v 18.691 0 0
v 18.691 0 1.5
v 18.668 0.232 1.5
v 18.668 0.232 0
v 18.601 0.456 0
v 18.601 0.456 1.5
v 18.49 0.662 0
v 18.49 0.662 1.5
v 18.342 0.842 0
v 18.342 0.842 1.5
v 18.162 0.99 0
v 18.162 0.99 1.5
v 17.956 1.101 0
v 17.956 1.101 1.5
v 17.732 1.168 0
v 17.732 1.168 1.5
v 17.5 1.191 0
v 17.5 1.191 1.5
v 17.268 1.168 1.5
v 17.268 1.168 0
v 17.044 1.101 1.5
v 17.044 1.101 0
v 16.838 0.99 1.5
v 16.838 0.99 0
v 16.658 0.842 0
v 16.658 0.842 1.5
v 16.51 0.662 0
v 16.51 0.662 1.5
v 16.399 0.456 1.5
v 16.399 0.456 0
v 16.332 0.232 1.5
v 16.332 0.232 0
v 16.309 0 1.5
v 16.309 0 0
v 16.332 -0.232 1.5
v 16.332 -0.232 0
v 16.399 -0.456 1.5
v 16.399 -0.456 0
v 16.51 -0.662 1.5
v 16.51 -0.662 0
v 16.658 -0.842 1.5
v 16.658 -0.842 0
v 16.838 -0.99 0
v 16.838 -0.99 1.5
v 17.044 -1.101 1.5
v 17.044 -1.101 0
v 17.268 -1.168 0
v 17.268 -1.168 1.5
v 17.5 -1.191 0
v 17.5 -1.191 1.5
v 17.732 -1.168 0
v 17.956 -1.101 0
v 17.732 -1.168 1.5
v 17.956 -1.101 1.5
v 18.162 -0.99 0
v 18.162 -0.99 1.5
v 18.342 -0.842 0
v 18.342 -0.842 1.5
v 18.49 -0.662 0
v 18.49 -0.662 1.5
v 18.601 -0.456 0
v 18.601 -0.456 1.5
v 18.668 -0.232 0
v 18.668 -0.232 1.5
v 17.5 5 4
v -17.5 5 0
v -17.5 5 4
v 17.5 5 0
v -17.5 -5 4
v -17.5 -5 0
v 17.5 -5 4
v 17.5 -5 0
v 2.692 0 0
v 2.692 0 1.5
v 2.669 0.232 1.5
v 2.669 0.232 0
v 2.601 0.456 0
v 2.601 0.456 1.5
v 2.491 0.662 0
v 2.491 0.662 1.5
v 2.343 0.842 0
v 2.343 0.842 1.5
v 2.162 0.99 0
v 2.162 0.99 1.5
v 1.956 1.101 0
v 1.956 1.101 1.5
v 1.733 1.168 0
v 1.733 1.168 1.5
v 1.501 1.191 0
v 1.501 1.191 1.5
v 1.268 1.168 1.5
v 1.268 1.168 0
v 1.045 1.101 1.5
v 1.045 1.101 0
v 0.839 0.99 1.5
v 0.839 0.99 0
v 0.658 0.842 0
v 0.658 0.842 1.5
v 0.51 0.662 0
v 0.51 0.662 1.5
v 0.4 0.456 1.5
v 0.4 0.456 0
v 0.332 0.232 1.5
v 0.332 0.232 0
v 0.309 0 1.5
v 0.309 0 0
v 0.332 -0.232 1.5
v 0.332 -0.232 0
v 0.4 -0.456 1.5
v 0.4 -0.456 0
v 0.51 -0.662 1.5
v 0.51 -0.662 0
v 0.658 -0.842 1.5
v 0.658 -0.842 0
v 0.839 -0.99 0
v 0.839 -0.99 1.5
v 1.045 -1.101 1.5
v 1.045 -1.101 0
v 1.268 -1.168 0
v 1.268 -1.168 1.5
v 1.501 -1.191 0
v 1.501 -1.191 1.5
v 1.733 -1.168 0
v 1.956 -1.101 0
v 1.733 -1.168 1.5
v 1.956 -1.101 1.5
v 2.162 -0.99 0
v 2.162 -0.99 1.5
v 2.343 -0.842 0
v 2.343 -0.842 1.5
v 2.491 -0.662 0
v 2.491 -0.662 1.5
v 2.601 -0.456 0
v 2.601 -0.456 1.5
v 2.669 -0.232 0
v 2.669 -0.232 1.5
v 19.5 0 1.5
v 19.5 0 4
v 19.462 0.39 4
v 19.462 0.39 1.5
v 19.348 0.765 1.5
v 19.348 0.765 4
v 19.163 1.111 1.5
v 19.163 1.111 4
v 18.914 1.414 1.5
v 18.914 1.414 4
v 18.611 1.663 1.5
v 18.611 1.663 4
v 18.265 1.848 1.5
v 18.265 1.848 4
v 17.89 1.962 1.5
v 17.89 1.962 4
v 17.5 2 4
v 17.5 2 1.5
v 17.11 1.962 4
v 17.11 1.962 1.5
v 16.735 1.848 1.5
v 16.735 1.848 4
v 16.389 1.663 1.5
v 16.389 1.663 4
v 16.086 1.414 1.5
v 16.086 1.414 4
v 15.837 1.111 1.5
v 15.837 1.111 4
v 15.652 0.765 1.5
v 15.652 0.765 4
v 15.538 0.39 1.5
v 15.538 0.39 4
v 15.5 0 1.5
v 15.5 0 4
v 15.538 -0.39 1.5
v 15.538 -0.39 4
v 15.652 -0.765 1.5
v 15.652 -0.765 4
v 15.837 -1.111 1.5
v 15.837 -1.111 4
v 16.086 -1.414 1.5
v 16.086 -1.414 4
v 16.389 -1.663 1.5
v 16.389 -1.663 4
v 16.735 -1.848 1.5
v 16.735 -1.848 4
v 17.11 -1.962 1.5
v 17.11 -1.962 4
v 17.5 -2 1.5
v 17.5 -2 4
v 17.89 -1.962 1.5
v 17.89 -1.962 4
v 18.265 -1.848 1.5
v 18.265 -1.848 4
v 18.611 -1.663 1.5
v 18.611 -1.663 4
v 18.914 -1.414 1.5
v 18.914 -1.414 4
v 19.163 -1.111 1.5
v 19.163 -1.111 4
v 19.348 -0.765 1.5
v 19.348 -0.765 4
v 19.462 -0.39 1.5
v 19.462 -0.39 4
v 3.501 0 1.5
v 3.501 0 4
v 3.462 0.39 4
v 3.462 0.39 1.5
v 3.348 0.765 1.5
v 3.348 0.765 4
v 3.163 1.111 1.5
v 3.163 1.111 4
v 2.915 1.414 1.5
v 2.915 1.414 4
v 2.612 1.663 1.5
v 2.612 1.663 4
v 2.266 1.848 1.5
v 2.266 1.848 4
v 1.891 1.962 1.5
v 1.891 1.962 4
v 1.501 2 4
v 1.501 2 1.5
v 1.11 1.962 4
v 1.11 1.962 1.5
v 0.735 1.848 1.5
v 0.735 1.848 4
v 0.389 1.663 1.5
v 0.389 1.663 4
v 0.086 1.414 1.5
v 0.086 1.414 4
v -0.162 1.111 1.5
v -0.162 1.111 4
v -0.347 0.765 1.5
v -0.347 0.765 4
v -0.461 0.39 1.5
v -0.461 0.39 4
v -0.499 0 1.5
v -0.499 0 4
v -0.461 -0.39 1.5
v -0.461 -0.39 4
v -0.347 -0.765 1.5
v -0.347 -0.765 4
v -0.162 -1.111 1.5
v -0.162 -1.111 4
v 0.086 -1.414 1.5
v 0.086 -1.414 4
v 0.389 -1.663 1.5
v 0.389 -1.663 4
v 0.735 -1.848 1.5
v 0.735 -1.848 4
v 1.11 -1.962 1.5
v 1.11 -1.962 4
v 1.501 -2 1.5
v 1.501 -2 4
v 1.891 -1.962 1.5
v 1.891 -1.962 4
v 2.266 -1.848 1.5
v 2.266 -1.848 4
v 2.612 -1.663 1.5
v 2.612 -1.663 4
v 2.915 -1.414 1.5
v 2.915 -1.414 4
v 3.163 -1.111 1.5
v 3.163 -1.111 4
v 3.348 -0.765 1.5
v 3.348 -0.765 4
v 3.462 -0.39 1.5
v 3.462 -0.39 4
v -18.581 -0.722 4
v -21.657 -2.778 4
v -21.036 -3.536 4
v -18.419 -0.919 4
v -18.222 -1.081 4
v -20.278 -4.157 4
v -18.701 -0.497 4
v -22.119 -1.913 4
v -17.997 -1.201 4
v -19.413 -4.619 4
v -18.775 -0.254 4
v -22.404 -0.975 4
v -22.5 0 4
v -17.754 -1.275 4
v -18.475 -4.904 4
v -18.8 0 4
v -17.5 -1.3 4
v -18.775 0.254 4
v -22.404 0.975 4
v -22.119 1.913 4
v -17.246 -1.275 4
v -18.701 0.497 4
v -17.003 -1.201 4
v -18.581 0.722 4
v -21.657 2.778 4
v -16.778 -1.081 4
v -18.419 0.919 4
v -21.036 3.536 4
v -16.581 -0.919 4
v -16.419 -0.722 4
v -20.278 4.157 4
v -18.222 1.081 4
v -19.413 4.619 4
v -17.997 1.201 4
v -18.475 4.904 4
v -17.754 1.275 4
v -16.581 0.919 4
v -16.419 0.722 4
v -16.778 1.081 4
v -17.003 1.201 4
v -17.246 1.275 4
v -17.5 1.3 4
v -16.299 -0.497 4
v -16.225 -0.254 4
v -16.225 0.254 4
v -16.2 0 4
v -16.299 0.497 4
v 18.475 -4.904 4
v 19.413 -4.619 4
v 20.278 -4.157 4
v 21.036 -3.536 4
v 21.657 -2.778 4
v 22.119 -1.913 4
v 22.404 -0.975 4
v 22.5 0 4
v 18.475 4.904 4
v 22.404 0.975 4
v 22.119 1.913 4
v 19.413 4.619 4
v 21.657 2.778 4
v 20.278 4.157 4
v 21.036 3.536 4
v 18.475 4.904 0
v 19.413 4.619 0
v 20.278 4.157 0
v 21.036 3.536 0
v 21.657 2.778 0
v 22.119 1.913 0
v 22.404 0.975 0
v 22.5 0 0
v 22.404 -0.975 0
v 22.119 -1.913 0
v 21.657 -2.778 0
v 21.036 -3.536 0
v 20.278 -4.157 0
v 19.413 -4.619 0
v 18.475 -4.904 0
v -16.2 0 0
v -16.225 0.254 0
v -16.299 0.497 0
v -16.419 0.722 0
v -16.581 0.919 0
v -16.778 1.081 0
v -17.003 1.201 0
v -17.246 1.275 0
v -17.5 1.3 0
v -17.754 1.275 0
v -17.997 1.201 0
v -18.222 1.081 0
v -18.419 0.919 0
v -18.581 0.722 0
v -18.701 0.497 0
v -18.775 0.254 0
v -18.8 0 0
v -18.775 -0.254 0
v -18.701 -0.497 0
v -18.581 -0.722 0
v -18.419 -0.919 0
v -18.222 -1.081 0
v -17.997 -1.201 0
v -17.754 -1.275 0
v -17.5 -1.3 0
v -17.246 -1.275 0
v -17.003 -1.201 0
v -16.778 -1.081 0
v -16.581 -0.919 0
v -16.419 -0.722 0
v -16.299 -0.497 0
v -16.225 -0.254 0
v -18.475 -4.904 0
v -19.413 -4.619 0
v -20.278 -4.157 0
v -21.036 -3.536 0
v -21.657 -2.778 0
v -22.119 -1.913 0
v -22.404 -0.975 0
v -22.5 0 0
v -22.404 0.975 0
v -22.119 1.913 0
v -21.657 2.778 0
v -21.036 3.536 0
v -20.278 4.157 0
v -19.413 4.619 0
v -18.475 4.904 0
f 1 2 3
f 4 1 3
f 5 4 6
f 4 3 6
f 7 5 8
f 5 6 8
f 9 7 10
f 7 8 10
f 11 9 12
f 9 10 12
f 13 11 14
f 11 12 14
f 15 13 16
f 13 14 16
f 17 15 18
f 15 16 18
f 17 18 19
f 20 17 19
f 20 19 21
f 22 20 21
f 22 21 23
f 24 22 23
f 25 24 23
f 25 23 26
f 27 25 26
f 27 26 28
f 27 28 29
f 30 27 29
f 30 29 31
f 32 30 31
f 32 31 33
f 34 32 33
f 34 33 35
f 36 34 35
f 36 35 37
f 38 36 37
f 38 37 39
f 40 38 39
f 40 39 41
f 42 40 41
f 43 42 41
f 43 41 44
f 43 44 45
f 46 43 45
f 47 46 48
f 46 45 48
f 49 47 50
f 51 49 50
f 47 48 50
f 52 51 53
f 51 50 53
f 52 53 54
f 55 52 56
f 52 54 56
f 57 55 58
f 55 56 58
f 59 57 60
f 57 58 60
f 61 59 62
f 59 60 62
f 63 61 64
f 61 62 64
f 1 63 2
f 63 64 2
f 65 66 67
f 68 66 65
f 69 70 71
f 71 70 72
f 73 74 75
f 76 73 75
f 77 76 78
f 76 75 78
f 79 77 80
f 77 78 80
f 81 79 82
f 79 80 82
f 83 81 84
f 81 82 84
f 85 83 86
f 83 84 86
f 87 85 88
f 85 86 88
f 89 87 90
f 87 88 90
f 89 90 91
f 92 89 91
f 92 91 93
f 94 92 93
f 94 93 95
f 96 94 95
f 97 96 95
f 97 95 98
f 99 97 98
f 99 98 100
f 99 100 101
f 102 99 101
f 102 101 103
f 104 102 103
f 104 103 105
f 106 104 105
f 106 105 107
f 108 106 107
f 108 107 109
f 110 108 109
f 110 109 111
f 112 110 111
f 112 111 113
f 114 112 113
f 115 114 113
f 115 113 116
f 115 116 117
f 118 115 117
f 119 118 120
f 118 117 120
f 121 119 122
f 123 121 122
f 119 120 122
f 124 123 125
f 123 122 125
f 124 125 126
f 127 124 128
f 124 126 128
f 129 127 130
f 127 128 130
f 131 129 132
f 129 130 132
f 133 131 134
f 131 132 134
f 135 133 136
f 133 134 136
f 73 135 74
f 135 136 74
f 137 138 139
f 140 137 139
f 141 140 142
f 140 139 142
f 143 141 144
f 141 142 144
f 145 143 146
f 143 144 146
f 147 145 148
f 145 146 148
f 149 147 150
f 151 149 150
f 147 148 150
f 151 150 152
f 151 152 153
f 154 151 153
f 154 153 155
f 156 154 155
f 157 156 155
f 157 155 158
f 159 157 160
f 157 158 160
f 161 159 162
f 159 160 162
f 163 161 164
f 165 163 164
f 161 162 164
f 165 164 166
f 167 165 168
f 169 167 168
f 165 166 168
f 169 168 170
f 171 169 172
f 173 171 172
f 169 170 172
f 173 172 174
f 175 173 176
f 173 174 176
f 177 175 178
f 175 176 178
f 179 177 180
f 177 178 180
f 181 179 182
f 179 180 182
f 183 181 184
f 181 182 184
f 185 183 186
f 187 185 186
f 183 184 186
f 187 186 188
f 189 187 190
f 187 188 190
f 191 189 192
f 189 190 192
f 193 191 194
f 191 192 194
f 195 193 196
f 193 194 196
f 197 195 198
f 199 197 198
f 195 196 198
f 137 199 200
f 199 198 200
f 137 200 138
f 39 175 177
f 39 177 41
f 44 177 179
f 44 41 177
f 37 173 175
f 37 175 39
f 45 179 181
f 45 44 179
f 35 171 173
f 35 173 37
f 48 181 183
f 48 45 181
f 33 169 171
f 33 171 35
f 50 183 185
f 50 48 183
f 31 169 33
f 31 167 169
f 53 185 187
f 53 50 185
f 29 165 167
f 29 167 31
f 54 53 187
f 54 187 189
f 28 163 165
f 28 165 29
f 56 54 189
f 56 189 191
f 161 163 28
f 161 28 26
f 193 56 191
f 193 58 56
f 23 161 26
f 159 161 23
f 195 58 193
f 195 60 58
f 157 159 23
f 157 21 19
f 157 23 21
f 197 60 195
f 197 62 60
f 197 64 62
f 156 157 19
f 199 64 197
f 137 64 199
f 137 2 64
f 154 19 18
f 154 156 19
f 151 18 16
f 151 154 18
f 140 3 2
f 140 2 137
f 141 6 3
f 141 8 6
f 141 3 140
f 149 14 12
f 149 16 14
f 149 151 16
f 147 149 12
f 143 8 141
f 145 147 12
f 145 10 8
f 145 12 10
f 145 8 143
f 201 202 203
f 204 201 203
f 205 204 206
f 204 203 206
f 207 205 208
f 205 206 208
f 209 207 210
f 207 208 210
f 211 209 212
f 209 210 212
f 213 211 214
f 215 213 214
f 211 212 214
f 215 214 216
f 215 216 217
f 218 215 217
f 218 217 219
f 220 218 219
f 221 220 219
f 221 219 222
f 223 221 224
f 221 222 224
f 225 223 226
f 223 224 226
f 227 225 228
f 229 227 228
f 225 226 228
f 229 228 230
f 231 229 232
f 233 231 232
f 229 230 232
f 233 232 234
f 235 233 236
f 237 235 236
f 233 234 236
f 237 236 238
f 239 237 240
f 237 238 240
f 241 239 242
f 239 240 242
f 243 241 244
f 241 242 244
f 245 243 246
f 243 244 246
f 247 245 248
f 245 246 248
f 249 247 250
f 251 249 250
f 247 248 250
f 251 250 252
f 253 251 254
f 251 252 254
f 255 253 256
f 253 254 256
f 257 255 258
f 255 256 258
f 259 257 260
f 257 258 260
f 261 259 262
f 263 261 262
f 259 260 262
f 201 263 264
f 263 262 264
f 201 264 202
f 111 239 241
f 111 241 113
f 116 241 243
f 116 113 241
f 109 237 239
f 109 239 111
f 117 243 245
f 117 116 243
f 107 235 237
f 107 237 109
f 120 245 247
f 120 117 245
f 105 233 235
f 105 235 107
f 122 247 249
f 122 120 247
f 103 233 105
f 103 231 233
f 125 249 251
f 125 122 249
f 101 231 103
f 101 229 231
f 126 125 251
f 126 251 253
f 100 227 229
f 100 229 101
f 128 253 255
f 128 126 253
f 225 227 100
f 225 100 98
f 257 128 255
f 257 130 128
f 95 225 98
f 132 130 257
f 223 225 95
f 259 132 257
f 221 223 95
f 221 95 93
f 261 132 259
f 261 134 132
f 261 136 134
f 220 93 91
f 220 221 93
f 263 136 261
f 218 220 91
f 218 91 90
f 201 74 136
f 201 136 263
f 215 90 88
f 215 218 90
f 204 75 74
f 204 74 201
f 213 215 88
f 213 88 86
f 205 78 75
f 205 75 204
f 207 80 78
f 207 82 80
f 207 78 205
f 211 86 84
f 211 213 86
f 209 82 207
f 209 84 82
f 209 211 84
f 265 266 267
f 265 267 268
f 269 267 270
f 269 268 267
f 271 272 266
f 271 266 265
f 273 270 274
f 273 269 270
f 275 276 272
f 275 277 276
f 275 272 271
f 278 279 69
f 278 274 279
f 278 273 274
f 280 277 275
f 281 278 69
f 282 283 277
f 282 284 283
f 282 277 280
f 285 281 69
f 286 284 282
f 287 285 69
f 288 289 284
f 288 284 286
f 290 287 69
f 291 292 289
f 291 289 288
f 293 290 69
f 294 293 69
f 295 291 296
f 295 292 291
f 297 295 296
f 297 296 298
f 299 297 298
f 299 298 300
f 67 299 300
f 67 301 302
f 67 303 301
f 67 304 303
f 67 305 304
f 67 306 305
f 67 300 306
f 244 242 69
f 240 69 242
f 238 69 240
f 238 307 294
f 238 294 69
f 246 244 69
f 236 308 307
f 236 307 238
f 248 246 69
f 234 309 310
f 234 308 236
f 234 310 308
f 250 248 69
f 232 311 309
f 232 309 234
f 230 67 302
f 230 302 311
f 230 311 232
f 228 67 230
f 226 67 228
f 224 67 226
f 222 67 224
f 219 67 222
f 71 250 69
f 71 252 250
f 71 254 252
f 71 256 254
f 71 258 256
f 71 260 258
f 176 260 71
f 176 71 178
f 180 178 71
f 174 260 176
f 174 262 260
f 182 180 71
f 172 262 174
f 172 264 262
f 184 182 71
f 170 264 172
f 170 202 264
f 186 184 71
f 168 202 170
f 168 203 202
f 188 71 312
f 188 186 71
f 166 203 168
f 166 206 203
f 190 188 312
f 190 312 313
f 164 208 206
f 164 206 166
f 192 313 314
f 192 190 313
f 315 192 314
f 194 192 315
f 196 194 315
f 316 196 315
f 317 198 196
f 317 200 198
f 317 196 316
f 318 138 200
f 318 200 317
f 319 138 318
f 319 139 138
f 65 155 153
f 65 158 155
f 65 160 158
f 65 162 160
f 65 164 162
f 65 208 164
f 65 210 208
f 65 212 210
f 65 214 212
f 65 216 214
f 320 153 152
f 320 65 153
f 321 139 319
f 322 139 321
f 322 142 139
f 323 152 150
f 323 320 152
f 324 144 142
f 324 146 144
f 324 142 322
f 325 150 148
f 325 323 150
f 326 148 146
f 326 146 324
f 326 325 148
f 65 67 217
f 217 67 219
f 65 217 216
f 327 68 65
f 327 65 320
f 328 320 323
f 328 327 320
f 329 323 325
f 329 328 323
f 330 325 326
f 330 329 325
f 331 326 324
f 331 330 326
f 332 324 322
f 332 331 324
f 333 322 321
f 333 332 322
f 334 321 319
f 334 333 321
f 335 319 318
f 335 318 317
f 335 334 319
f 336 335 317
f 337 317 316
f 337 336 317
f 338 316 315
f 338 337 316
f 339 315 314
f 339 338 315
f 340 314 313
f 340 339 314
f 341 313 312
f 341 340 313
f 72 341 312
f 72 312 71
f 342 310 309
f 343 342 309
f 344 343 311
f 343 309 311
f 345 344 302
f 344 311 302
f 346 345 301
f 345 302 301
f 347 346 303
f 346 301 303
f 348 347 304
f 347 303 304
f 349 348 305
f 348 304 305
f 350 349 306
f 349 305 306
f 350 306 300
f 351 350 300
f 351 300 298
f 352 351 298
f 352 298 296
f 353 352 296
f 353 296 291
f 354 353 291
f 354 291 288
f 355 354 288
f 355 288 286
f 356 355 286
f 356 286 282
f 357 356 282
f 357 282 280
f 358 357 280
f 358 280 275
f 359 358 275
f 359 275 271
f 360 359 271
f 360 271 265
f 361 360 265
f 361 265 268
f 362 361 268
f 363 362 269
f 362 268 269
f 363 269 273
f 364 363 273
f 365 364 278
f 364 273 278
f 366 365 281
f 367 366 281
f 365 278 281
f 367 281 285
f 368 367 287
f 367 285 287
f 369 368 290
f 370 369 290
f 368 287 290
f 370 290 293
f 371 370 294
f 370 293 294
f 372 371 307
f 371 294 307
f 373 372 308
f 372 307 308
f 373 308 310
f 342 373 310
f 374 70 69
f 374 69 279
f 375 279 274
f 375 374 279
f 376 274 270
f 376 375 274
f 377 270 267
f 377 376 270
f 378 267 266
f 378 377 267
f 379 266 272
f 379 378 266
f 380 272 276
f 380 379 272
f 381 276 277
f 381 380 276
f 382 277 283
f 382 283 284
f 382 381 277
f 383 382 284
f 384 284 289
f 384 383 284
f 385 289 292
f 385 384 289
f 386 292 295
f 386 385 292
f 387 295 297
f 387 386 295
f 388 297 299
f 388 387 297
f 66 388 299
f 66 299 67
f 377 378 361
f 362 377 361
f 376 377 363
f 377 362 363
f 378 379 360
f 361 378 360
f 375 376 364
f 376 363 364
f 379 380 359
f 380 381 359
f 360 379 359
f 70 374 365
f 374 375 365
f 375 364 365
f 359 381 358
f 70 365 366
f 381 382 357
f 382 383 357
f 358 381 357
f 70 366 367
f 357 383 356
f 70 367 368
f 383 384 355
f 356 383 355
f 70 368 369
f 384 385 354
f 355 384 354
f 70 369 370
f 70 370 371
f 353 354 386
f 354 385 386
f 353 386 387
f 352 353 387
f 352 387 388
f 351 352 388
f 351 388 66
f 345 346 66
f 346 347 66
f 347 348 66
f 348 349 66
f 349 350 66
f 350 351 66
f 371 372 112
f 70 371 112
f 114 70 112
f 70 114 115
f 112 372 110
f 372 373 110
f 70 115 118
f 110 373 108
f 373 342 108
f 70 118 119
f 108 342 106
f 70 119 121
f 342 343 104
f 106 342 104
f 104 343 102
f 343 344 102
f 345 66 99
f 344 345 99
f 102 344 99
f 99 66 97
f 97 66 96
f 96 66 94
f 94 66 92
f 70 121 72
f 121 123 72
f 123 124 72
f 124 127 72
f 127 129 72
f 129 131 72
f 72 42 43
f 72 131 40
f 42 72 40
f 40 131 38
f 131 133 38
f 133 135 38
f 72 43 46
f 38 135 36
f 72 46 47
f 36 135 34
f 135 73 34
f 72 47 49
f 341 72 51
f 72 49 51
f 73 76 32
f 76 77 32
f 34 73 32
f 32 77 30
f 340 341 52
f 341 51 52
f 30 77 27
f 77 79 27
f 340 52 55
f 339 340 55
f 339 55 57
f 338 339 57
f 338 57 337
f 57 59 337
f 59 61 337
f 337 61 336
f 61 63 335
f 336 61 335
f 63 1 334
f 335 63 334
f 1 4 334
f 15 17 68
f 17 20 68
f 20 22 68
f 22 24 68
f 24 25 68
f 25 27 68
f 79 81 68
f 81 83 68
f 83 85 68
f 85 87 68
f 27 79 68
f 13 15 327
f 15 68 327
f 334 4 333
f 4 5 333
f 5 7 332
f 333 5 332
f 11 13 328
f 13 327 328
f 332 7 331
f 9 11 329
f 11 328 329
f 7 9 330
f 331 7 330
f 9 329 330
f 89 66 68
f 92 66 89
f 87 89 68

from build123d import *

# Parameters (mm, degrees)
ESQUISSE1_W             = 35
ESQUISSE1_H             = 10
BOSS_EXTRU_1_DEPTH      = 4
ENL_V_MAT_EXTRU_1_REACH = 25.393
ESQUISSE2_R             = 1.19126
ESQUISSE2_R_2           = 1.3
ESQUISSE4_R             = 2
ENL_V_MAT_EXTRU_2_DEPTH = 2.5


with BuildPart() as part:
    # Esquisse1 → Boss.-Extru.1 (new body)
    with BuildSketch(Plane.XY):
        Rectangle(ESQUISSE1_W, ESQUISSE1_H)
        with BuildLine():
            ThreePointArc((17.5, 5), (22.5, 0), (17.5, -5))
            Line((17.5, -5), (17.5, 5))
        make_face()
        with BuildLine():
            ThreePointArc((-17.5, -5), (-22.5, 0), (-17.5, 5))
            Line((-17.5, 5), (-17.5, -5))
        make_face()
    extrude(amount=BOSS_EXTRU_1_DEPTH)

    # Esquisse2 → Enlèv. mat.-Extru.1 (cut, up to next)
    with BuildSketch(Plane.XY.offset(4), mode=Mode.PRIVATE) as enl_v_mat_extru_1_sk1:
        with Locations((17.5, 0)):
            Circle(ESQUISSE2_R)
    enl_v_mat_extru_1_tool1 = extrude(enl_v_mat_extru_1_sk1.sketch, amount=-ENL_V_MAT_EXTRU_1_REACH, mode=Mode.PRIVATE) & part.part
    # Esquisse2 → Enlèv. mat.-Extru.1 (cut, up to next)
    with BuildSketch(Plane.XY.offset(4), mode=Mode.PRIVATE) as enl_v_mat_extru_1_sk2:
        with Locations((1.50054, 0)):
            Circle(ESQUISSE2_R)
    enl_v_mat_extru_1_tool2 = extrude(enl_v_mat_extru_1_sk2.sketch, amount=-ENL_V_MAT_EXTRU_1_REACH, mode=Mode.PRIVATE) & part.part
    # Esquisse2 → Enlèv. mat.-Extru.1 (cut, up to next)
    with BuildSketch(Plane.XY.offset(4), mode=Mode.PRIVATE) as enl_v_mat_extru_1_sk3:
        with Locations((-17.5, 0)):
            Circle(ESQUISSE2_R_2)
    enl_v_mat_extru_1_tool3 = extrude(enl_v_mat_extru_1_sk3.sketch, amount=-ENL_V_MAT_EXTRU_1_REACH, mode=Mode.PRIVATE) & part.part
    add(enl_v_mat_extru_1_tool1.solids().sort_by_distance((17.5, 0, 4))[0], mode=Mode.SUBTRACT)
    add(enl_v_mat_extru_1_tool2.solids().sort_by_distance((1.50054, 0, 4))[0], mode=Mode.SUBTRACT)
    add(enl_v_mat_extru_1_tool3.solids().sort_by_distance((-17.5, 0, 4))[0], mode=Mode.SUBTRACT)

    # Esquisse4 → Enlèv. mat.-Extru.2 (cut)
    with BuildSketch(Plane.XY.offset(4)):
        with Locations((17.5, 0)):
            Circle(ESQUISSE4_R)
        with Locations((1.50054, 0)):
            Circle(ESQUISSE4_R)
    extrude(amount=-ENL_V_MAT_EXTRU_2_DEPTH, mode=Mode.SUBTRACT)


solid = part.part
